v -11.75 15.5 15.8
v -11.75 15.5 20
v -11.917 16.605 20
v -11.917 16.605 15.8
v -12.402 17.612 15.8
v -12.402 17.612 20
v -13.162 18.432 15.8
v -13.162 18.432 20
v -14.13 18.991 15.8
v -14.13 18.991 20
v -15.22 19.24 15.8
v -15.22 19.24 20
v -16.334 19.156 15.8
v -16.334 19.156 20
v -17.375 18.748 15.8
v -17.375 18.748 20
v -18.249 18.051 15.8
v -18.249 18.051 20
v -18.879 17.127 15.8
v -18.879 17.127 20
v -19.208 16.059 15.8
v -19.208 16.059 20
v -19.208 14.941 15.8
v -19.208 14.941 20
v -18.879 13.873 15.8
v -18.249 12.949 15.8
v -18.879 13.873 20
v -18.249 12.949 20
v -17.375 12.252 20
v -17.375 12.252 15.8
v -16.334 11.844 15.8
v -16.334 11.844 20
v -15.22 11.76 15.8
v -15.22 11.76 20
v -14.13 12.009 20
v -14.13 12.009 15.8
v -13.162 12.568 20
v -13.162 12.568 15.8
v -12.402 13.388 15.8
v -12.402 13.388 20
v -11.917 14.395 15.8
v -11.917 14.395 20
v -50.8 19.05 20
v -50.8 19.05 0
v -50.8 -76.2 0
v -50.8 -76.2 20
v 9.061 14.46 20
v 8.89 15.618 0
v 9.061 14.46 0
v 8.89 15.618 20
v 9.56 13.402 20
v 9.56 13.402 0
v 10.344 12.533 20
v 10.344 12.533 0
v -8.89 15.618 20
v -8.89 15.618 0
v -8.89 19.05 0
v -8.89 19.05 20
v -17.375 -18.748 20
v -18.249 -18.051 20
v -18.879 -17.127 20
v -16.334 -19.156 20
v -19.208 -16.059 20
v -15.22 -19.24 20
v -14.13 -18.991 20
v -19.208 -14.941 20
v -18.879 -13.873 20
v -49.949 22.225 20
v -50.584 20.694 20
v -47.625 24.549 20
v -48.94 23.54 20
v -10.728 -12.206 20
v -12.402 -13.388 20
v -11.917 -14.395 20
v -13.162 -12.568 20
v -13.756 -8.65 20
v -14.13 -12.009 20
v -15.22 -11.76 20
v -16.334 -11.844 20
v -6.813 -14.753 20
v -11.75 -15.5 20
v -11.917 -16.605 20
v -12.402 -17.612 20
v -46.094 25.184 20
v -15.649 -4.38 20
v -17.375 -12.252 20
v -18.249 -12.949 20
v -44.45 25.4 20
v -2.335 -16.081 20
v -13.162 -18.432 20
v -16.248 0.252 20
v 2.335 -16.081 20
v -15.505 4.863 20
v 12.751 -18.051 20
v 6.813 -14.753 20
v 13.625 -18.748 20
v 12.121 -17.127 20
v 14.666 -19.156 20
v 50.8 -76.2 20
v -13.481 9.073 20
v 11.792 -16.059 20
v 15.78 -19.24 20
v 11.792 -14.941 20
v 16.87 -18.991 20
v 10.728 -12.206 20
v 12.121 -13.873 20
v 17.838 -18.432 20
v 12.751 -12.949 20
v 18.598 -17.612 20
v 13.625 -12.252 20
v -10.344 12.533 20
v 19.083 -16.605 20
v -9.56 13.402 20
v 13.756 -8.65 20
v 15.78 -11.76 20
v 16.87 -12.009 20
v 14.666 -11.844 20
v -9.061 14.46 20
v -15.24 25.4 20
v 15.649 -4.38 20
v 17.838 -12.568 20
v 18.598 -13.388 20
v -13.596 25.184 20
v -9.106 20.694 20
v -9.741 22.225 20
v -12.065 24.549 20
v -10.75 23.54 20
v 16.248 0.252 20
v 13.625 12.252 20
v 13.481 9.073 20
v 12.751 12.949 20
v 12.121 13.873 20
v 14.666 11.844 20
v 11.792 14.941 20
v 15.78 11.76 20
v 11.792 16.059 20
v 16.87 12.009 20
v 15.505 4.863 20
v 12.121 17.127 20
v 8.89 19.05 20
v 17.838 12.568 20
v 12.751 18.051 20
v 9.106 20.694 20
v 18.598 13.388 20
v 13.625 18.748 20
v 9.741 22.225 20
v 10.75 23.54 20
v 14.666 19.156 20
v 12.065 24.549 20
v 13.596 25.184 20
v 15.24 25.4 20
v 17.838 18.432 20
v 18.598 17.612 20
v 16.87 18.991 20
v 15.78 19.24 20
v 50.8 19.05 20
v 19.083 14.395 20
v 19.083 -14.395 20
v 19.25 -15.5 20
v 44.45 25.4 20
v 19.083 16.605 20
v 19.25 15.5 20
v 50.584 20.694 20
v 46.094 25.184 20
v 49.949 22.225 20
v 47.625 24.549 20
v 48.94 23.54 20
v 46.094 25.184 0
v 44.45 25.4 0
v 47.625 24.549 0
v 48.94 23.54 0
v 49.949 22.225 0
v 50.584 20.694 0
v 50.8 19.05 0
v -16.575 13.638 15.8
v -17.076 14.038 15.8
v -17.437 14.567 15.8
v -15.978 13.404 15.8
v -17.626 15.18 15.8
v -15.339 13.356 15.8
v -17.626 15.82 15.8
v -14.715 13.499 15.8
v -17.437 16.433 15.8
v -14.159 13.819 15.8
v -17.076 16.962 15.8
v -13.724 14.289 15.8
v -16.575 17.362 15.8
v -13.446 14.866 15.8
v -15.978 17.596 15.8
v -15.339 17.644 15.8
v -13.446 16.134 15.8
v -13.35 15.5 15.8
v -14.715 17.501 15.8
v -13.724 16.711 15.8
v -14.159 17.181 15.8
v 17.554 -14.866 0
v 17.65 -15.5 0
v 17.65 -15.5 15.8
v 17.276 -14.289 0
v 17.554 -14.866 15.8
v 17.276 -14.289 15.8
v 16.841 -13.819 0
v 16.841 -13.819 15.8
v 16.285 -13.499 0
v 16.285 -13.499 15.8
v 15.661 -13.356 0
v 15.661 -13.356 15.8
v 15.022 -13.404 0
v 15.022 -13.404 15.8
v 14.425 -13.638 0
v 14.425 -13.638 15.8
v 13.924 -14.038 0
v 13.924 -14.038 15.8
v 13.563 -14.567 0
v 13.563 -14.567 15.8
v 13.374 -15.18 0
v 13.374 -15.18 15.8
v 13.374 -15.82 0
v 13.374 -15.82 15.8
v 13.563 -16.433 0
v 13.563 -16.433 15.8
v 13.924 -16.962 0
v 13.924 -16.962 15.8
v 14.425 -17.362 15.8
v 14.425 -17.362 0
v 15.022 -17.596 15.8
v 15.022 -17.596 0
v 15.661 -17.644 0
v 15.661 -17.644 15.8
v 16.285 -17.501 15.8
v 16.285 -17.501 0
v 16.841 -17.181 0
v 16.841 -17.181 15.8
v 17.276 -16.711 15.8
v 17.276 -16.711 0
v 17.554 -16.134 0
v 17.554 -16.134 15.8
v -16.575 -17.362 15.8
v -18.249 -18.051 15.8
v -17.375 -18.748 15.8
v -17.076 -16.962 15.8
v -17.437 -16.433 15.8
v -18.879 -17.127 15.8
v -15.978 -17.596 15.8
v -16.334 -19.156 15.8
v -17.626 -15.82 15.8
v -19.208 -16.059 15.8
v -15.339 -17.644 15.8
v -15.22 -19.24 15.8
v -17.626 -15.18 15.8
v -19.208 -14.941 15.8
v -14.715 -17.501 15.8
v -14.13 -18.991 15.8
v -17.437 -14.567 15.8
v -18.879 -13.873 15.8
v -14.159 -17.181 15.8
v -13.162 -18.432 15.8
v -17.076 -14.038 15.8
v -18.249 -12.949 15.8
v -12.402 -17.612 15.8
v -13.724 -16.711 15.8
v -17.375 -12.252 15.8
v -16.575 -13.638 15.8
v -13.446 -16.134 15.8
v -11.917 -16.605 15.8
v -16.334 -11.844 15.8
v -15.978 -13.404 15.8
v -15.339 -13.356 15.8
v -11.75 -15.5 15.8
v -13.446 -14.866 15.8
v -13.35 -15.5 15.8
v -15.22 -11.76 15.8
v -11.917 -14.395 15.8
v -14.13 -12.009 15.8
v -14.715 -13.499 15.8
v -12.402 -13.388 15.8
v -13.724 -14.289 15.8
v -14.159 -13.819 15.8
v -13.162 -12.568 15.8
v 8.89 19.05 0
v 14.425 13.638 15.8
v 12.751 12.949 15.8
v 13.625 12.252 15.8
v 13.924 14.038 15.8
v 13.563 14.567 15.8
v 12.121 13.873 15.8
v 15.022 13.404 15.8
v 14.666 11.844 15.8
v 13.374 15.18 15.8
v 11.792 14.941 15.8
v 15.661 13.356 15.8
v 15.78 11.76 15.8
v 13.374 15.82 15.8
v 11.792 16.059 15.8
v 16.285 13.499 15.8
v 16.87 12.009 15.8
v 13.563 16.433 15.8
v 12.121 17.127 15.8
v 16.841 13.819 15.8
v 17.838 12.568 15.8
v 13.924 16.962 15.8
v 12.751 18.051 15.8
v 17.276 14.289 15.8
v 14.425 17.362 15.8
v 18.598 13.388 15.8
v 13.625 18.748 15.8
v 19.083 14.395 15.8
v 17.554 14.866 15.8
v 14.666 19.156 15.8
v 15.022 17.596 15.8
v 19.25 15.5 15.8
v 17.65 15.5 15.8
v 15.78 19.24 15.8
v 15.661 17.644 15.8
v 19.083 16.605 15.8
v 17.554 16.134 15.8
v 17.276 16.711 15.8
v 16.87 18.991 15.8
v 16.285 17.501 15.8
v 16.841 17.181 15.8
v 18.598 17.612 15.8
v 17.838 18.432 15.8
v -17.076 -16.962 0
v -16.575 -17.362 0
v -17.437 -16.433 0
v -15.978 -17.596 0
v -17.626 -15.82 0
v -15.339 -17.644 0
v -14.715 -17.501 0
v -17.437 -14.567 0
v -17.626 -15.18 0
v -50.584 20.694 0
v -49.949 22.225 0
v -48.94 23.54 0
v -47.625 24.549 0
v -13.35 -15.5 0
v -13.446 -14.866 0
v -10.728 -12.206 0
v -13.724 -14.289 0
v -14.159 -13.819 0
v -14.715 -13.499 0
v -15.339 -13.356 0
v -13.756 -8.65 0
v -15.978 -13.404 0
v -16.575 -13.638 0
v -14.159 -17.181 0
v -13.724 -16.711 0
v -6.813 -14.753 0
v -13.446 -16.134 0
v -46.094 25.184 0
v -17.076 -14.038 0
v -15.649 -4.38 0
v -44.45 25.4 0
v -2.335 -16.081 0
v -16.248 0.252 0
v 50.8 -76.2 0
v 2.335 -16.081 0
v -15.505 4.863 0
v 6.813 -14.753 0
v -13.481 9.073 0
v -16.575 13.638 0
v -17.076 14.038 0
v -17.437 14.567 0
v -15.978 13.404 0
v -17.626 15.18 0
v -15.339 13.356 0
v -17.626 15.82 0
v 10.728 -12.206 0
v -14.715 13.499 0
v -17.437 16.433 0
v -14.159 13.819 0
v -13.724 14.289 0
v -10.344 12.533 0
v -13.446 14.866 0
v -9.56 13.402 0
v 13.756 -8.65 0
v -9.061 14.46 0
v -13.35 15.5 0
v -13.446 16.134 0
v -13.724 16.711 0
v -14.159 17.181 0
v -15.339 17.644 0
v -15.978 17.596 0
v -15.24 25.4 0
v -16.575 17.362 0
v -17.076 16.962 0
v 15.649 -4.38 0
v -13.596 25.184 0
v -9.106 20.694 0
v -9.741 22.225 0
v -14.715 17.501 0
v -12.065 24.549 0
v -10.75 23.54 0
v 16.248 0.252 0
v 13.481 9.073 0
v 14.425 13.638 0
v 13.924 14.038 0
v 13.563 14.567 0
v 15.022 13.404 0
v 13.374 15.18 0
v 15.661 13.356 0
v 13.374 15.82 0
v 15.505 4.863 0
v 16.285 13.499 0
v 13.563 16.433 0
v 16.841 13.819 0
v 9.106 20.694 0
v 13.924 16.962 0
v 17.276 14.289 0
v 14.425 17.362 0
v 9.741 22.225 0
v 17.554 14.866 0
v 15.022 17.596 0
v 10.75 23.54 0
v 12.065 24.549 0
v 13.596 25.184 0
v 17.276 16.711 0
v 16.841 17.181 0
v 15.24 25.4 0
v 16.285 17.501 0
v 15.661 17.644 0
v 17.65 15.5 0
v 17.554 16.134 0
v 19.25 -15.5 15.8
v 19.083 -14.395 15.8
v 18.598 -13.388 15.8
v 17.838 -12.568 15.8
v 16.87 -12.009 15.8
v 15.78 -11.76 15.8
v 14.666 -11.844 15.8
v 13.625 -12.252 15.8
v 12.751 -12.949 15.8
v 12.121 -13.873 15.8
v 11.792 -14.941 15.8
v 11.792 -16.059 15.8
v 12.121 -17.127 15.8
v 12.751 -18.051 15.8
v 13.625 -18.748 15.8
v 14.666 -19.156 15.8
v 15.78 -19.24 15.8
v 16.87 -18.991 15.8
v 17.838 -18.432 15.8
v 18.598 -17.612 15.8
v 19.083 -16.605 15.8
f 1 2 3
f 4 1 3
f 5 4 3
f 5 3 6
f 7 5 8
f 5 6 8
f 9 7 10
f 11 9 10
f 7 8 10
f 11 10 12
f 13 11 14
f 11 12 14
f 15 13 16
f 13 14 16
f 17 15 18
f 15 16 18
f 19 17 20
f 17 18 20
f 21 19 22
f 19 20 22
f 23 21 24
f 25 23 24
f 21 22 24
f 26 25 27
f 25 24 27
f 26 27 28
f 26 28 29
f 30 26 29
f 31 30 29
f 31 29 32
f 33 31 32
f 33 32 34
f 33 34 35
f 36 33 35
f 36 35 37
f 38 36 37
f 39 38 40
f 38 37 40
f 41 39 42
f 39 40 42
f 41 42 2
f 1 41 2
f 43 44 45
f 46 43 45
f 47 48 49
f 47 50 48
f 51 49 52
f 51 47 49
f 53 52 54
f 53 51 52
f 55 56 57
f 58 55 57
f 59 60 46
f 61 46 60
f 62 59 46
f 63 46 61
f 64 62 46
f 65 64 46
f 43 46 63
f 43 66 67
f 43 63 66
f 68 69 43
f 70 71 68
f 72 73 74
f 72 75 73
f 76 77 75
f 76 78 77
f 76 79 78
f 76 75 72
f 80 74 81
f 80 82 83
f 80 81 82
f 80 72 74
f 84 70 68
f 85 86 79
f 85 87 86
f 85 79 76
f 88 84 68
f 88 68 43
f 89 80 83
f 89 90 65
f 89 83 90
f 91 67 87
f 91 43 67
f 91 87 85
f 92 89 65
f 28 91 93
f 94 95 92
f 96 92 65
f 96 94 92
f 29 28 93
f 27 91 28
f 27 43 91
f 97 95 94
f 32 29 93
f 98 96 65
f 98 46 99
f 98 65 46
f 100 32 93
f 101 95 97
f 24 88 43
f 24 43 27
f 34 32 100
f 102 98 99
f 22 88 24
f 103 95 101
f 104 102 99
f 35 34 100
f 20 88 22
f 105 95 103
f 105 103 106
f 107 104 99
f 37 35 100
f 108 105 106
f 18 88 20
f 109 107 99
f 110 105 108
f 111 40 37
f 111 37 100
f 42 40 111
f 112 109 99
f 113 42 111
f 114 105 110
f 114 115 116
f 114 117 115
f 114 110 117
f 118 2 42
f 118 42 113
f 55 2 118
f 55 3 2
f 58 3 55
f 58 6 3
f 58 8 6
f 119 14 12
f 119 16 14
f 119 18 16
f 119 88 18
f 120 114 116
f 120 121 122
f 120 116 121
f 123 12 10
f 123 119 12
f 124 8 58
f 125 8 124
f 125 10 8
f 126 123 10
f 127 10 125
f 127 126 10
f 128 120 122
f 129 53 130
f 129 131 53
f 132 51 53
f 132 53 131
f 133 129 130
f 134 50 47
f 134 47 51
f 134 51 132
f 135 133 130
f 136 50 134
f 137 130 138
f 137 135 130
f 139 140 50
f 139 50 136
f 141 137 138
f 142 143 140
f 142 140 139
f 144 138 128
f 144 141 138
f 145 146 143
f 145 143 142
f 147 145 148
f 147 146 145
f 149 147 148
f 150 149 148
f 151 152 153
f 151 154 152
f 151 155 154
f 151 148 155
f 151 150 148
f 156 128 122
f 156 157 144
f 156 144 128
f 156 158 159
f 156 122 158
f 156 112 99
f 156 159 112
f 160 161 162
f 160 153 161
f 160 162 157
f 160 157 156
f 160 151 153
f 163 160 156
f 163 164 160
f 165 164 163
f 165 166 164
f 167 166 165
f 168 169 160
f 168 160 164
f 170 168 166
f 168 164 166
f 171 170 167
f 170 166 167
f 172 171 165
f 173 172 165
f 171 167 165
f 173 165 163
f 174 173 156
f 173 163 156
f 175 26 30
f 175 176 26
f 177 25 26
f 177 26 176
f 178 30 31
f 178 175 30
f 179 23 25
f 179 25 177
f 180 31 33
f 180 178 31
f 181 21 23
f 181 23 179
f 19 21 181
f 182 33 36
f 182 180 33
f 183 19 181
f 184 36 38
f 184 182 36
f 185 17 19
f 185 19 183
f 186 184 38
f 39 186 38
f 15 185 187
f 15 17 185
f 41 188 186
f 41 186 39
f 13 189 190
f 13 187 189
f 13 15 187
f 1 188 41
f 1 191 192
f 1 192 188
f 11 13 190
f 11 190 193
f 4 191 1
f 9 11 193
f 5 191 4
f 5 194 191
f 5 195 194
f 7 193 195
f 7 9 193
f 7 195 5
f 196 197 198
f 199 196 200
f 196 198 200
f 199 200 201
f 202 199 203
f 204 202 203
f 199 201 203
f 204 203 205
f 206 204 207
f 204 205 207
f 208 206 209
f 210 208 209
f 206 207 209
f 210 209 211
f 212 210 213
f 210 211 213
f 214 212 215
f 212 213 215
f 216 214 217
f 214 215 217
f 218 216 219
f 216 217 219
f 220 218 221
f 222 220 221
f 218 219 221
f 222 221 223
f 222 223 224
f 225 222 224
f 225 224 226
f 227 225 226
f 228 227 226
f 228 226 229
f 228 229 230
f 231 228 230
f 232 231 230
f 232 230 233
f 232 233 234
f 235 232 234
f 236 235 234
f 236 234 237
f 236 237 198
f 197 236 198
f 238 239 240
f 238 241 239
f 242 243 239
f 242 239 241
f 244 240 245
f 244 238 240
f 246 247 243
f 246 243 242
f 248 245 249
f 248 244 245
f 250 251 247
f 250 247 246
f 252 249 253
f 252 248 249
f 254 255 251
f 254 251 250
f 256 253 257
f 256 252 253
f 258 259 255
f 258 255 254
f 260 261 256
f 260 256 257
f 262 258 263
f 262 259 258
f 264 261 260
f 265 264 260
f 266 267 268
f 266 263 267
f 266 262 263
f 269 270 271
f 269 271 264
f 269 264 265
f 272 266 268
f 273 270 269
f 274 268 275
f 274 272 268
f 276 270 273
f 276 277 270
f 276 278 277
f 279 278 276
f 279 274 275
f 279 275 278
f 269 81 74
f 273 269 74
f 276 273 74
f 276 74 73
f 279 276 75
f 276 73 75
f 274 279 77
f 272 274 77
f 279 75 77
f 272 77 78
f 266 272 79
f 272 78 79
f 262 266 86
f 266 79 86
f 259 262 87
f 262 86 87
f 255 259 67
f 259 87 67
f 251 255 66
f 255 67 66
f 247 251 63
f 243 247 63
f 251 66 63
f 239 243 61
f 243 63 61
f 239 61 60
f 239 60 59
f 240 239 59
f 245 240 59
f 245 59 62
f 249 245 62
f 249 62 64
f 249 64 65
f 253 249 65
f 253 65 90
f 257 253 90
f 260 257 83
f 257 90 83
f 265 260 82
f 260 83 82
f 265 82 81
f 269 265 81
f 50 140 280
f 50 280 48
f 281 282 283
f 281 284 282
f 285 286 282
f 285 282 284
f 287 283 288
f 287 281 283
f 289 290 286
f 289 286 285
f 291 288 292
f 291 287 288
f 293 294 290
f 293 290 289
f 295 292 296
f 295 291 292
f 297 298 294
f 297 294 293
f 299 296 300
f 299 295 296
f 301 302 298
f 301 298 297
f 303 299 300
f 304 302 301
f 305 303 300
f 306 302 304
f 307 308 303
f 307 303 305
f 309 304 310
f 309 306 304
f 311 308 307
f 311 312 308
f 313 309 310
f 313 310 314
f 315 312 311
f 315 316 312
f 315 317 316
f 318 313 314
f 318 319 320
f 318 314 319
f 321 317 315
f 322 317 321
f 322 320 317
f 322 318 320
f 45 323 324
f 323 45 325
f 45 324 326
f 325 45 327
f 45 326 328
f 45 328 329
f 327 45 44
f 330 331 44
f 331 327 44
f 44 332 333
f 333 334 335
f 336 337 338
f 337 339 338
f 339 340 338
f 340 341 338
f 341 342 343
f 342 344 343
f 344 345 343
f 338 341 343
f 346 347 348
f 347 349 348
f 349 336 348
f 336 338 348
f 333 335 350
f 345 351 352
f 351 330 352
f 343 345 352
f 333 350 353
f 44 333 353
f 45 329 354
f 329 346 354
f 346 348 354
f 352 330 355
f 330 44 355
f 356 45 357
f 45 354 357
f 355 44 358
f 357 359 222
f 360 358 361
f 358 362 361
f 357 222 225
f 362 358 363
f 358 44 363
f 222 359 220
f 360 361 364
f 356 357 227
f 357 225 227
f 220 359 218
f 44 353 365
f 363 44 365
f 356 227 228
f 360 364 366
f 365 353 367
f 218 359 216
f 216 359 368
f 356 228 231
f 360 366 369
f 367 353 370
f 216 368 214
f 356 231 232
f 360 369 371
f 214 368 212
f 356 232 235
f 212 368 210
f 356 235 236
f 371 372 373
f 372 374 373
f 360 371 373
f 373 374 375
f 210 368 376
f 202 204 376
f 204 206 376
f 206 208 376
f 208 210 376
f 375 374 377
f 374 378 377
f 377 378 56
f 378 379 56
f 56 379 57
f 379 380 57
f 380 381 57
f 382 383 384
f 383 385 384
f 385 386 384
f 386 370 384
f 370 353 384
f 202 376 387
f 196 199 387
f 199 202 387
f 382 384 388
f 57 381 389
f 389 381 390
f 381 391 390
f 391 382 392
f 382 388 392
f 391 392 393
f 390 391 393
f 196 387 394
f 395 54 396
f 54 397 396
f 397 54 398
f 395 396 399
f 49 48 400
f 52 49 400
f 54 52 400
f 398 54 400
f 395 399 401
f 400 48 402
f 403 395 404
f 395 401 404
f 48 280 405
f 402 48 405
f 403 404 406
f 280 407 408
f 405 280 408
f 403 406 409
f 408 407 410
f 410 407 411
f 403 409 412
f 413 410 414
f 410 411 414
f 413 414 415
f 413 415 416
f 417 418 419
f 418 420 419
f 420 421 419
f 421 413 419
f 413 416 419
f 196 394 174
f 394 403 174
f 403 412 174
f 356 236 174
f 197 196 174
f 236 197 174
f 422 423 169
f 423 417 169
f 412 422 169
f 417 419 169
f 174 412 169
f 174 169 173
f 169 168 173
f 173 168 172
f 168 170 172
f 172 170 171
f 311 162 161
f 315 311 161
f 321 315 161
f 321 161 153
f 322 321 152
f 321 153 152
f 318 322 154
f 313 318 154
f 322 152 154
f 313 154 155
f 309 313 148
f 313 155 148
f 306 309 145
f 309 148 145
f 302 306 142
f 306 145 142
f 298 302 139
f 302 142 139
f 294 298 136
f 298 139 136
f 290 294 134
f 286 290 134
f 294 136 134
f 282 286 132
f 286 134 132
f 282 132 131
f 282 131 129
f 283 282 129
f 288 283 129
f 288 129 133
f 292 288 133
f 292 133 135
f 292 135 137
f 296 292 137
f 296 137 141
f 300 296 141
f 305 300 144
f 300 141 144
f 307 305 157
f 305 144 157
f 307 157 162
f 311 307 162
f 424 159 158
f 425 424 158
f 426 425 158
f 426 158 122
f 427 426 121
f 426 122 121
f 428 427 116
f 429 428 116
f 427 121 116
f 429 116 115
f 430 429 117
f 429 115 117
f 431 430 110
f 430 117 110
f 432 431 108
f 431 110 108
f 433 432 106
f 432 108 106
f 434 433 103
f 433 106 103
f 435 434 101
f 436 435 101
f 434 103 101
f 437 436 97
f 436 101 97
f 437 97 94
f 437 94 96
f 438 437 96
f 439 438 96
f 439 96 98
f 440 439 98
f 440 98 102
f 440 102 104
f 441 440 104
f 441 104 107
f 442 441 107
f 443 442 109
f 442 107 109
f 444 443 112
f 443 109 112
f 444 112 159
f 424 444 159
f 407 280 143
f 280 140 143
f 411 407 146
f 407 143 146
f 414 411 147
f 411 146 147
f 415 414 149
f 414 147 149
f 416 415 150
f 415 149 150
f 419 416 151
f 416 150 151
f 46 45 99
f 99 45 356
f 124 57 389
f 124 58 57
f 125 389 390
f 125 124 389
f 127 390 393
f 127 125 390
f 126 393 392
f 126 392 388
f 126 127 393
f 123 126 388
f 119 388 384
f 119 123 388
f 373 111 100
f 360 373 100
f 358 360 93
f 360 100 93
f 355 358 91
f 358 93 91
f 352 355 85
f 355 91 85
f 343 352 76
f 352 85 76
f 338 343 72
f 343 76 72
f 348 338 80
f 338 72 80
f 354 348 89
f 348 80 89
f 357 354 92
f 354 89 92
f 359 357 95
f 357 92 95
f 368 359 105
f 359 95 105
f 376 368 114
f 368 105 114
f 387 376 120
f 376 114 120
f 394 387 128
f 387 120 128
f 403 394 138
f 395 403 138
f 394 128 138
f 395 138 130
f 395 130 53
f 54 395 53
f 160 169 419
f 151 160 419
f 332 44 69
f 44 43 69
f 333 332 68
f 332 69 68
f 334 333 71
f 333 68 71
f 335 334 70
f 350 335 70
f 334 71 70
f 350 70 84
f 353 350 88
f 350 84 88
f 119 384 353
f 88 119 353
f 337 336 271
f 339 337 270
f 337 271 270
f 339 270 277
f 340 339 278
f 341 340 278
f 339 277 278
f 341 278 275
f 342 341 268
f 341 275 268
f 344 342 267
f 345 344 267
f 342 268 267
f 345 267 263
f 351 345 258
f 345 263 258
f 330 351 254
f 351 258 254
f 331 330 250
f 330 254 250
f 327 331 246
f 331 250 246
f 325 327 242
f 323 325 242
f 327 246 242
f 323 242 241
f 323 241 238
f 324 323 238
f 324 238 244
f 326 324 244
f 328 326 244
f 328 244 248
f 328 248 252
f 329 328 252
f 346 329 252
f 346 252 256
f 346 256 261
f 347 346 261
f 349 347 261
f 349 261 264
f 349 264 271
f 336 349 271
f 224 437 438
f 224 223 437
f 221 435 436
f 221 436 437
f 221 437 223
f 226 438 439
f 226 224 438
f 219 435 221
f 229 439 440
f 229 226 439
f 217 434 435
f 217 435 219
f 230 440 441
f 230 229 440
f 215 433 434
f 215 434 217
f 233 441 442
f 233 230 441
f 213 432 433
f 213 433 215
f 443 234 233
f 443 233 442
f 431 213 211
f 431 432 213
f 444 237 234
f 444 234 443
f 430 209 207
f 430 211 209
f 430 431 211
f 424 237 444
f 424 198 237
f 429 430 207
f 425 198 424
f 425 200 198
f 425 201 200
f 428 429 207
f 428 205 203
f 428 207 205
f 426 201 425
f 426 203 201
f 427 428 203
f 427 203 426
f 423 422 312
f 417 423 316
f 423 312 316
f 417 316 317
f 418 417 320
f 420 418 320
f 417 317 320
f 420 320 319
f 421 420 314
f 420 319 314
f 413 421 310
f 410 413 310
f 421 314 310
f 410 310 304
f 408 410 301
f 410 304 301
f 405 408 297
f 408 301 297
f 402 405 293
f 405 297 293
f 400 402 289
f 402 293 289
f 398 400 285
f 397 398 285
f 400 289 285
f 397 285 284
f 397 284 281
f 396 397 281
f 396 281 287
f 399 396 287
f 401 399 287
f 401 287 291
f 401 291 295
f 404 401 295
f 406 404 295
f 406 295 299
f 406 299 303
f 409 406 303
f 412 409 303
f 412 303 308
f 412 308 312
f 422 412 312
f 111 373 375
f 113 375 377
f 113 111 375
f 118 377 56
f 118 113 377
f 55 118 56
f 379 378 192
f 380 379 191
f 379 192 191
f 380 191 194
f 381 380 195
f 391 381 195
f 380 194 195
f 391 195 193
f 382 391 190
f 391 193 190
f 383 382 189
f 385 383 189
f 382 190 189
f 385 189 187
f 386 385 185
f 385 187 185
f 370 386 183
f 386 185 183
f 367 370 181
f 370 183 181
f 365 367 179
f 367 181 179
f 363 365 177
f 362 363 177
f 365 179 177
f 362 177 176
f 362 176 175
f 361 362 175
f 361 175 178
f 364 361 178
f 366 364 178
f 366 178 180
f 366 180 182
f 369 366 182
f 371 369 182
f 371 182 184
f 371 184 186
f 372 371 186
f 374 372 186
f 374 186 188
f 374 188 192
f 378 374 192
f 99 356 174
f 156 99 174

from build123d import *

# Parameters (mm, degrees)
BOSS_EXTRUDE1_DEPTH = 20
SKETCH2_R           = 16.25
SKETCH2_R_2         = 2.15
CUT_EXTRUDE1_DEPTH  = 20
SKETCH5_R           = 3.75
CUT_EXTRUDE4_DEPTH  = 4.2
FILLET3_R           = 4
FILLET4_R           = 6.35


with BuildPart() as part:
    # Sketch1 → Boss-Extrude1 (new body)
    with BuildSketch(Plane.XY):
        Polygon((50.8, 25.4), (8.89, 25.4), (8.89, 13.302928249), (-8.89, 13.302928249), (-8.89, 25.4), (-50.8, 25.4), (-50.8, -76.2), (50.8, -76.2), align=None)
    extrude(amount=BOSS_EXTRUDE1_DEPTH)

    # Sketch2 → Cut-Extrude1 (cut)
    with BuildSketch(Plane.XY.offset(20)):
        Circle(SKETCH2_R)
        with Locations((-15.5, -15.5)):
            Circle(SKETCH2_R_2)
        with Locations((-15.5, 15.5)):
            Circle(SKETCH2_R_2)
        with Locations((15.5, -15.5)):
            Circle(SKETCH2_R_2)
        with Locations((15.5, 15.5)):
            Circle(SKETCH2_R_2)
    extrude(amount=-CUT_EXTRUDE1_DEPTH, mode=Mode.SUBTRACT)

    # Sketch5 → Cut-Extrude4 (cut)
    with BuildSketch(Plane.XY.offset(20)):
        with Locations((-15.5, 15.5)):
            Circle(SKETCH5_R)
        with Locations((15.5, 15.5)):
            Circle(SKETCH5_R)
        with Locations((15.5, -15.5)):
            Circle(SKETCH5_R)
        with Locations((-15.5, -15.5)):
            Circle(SKETCH5_R)
    extrude(amount=-CUT_EXTRUDE4_DEPTH, mode=Mode.SUBTRACT)

    # Fillet3
    fillet3_edges = [part.edges().sort_by_distance(p)[0] for p in [
        (8.89, 13.602587989, 10),
        (-8.89, 13.602587989, 10),
    ]]
    fillet(fillet3_edges, radius=FILLET3_R)

    # Fillet4
    fillet4_edges = [part.edges().sort_by_distance(p)[0] for p in [
        (-50.8, 25.4, 10),
        (-8.89, 25.4, 10),
        (8.89, 25.4, 10),
        (50.8, 25.4, 10),
    ]]
    fillet(fillet4_edges, radius=FILLET4_R)


solid = part.part
